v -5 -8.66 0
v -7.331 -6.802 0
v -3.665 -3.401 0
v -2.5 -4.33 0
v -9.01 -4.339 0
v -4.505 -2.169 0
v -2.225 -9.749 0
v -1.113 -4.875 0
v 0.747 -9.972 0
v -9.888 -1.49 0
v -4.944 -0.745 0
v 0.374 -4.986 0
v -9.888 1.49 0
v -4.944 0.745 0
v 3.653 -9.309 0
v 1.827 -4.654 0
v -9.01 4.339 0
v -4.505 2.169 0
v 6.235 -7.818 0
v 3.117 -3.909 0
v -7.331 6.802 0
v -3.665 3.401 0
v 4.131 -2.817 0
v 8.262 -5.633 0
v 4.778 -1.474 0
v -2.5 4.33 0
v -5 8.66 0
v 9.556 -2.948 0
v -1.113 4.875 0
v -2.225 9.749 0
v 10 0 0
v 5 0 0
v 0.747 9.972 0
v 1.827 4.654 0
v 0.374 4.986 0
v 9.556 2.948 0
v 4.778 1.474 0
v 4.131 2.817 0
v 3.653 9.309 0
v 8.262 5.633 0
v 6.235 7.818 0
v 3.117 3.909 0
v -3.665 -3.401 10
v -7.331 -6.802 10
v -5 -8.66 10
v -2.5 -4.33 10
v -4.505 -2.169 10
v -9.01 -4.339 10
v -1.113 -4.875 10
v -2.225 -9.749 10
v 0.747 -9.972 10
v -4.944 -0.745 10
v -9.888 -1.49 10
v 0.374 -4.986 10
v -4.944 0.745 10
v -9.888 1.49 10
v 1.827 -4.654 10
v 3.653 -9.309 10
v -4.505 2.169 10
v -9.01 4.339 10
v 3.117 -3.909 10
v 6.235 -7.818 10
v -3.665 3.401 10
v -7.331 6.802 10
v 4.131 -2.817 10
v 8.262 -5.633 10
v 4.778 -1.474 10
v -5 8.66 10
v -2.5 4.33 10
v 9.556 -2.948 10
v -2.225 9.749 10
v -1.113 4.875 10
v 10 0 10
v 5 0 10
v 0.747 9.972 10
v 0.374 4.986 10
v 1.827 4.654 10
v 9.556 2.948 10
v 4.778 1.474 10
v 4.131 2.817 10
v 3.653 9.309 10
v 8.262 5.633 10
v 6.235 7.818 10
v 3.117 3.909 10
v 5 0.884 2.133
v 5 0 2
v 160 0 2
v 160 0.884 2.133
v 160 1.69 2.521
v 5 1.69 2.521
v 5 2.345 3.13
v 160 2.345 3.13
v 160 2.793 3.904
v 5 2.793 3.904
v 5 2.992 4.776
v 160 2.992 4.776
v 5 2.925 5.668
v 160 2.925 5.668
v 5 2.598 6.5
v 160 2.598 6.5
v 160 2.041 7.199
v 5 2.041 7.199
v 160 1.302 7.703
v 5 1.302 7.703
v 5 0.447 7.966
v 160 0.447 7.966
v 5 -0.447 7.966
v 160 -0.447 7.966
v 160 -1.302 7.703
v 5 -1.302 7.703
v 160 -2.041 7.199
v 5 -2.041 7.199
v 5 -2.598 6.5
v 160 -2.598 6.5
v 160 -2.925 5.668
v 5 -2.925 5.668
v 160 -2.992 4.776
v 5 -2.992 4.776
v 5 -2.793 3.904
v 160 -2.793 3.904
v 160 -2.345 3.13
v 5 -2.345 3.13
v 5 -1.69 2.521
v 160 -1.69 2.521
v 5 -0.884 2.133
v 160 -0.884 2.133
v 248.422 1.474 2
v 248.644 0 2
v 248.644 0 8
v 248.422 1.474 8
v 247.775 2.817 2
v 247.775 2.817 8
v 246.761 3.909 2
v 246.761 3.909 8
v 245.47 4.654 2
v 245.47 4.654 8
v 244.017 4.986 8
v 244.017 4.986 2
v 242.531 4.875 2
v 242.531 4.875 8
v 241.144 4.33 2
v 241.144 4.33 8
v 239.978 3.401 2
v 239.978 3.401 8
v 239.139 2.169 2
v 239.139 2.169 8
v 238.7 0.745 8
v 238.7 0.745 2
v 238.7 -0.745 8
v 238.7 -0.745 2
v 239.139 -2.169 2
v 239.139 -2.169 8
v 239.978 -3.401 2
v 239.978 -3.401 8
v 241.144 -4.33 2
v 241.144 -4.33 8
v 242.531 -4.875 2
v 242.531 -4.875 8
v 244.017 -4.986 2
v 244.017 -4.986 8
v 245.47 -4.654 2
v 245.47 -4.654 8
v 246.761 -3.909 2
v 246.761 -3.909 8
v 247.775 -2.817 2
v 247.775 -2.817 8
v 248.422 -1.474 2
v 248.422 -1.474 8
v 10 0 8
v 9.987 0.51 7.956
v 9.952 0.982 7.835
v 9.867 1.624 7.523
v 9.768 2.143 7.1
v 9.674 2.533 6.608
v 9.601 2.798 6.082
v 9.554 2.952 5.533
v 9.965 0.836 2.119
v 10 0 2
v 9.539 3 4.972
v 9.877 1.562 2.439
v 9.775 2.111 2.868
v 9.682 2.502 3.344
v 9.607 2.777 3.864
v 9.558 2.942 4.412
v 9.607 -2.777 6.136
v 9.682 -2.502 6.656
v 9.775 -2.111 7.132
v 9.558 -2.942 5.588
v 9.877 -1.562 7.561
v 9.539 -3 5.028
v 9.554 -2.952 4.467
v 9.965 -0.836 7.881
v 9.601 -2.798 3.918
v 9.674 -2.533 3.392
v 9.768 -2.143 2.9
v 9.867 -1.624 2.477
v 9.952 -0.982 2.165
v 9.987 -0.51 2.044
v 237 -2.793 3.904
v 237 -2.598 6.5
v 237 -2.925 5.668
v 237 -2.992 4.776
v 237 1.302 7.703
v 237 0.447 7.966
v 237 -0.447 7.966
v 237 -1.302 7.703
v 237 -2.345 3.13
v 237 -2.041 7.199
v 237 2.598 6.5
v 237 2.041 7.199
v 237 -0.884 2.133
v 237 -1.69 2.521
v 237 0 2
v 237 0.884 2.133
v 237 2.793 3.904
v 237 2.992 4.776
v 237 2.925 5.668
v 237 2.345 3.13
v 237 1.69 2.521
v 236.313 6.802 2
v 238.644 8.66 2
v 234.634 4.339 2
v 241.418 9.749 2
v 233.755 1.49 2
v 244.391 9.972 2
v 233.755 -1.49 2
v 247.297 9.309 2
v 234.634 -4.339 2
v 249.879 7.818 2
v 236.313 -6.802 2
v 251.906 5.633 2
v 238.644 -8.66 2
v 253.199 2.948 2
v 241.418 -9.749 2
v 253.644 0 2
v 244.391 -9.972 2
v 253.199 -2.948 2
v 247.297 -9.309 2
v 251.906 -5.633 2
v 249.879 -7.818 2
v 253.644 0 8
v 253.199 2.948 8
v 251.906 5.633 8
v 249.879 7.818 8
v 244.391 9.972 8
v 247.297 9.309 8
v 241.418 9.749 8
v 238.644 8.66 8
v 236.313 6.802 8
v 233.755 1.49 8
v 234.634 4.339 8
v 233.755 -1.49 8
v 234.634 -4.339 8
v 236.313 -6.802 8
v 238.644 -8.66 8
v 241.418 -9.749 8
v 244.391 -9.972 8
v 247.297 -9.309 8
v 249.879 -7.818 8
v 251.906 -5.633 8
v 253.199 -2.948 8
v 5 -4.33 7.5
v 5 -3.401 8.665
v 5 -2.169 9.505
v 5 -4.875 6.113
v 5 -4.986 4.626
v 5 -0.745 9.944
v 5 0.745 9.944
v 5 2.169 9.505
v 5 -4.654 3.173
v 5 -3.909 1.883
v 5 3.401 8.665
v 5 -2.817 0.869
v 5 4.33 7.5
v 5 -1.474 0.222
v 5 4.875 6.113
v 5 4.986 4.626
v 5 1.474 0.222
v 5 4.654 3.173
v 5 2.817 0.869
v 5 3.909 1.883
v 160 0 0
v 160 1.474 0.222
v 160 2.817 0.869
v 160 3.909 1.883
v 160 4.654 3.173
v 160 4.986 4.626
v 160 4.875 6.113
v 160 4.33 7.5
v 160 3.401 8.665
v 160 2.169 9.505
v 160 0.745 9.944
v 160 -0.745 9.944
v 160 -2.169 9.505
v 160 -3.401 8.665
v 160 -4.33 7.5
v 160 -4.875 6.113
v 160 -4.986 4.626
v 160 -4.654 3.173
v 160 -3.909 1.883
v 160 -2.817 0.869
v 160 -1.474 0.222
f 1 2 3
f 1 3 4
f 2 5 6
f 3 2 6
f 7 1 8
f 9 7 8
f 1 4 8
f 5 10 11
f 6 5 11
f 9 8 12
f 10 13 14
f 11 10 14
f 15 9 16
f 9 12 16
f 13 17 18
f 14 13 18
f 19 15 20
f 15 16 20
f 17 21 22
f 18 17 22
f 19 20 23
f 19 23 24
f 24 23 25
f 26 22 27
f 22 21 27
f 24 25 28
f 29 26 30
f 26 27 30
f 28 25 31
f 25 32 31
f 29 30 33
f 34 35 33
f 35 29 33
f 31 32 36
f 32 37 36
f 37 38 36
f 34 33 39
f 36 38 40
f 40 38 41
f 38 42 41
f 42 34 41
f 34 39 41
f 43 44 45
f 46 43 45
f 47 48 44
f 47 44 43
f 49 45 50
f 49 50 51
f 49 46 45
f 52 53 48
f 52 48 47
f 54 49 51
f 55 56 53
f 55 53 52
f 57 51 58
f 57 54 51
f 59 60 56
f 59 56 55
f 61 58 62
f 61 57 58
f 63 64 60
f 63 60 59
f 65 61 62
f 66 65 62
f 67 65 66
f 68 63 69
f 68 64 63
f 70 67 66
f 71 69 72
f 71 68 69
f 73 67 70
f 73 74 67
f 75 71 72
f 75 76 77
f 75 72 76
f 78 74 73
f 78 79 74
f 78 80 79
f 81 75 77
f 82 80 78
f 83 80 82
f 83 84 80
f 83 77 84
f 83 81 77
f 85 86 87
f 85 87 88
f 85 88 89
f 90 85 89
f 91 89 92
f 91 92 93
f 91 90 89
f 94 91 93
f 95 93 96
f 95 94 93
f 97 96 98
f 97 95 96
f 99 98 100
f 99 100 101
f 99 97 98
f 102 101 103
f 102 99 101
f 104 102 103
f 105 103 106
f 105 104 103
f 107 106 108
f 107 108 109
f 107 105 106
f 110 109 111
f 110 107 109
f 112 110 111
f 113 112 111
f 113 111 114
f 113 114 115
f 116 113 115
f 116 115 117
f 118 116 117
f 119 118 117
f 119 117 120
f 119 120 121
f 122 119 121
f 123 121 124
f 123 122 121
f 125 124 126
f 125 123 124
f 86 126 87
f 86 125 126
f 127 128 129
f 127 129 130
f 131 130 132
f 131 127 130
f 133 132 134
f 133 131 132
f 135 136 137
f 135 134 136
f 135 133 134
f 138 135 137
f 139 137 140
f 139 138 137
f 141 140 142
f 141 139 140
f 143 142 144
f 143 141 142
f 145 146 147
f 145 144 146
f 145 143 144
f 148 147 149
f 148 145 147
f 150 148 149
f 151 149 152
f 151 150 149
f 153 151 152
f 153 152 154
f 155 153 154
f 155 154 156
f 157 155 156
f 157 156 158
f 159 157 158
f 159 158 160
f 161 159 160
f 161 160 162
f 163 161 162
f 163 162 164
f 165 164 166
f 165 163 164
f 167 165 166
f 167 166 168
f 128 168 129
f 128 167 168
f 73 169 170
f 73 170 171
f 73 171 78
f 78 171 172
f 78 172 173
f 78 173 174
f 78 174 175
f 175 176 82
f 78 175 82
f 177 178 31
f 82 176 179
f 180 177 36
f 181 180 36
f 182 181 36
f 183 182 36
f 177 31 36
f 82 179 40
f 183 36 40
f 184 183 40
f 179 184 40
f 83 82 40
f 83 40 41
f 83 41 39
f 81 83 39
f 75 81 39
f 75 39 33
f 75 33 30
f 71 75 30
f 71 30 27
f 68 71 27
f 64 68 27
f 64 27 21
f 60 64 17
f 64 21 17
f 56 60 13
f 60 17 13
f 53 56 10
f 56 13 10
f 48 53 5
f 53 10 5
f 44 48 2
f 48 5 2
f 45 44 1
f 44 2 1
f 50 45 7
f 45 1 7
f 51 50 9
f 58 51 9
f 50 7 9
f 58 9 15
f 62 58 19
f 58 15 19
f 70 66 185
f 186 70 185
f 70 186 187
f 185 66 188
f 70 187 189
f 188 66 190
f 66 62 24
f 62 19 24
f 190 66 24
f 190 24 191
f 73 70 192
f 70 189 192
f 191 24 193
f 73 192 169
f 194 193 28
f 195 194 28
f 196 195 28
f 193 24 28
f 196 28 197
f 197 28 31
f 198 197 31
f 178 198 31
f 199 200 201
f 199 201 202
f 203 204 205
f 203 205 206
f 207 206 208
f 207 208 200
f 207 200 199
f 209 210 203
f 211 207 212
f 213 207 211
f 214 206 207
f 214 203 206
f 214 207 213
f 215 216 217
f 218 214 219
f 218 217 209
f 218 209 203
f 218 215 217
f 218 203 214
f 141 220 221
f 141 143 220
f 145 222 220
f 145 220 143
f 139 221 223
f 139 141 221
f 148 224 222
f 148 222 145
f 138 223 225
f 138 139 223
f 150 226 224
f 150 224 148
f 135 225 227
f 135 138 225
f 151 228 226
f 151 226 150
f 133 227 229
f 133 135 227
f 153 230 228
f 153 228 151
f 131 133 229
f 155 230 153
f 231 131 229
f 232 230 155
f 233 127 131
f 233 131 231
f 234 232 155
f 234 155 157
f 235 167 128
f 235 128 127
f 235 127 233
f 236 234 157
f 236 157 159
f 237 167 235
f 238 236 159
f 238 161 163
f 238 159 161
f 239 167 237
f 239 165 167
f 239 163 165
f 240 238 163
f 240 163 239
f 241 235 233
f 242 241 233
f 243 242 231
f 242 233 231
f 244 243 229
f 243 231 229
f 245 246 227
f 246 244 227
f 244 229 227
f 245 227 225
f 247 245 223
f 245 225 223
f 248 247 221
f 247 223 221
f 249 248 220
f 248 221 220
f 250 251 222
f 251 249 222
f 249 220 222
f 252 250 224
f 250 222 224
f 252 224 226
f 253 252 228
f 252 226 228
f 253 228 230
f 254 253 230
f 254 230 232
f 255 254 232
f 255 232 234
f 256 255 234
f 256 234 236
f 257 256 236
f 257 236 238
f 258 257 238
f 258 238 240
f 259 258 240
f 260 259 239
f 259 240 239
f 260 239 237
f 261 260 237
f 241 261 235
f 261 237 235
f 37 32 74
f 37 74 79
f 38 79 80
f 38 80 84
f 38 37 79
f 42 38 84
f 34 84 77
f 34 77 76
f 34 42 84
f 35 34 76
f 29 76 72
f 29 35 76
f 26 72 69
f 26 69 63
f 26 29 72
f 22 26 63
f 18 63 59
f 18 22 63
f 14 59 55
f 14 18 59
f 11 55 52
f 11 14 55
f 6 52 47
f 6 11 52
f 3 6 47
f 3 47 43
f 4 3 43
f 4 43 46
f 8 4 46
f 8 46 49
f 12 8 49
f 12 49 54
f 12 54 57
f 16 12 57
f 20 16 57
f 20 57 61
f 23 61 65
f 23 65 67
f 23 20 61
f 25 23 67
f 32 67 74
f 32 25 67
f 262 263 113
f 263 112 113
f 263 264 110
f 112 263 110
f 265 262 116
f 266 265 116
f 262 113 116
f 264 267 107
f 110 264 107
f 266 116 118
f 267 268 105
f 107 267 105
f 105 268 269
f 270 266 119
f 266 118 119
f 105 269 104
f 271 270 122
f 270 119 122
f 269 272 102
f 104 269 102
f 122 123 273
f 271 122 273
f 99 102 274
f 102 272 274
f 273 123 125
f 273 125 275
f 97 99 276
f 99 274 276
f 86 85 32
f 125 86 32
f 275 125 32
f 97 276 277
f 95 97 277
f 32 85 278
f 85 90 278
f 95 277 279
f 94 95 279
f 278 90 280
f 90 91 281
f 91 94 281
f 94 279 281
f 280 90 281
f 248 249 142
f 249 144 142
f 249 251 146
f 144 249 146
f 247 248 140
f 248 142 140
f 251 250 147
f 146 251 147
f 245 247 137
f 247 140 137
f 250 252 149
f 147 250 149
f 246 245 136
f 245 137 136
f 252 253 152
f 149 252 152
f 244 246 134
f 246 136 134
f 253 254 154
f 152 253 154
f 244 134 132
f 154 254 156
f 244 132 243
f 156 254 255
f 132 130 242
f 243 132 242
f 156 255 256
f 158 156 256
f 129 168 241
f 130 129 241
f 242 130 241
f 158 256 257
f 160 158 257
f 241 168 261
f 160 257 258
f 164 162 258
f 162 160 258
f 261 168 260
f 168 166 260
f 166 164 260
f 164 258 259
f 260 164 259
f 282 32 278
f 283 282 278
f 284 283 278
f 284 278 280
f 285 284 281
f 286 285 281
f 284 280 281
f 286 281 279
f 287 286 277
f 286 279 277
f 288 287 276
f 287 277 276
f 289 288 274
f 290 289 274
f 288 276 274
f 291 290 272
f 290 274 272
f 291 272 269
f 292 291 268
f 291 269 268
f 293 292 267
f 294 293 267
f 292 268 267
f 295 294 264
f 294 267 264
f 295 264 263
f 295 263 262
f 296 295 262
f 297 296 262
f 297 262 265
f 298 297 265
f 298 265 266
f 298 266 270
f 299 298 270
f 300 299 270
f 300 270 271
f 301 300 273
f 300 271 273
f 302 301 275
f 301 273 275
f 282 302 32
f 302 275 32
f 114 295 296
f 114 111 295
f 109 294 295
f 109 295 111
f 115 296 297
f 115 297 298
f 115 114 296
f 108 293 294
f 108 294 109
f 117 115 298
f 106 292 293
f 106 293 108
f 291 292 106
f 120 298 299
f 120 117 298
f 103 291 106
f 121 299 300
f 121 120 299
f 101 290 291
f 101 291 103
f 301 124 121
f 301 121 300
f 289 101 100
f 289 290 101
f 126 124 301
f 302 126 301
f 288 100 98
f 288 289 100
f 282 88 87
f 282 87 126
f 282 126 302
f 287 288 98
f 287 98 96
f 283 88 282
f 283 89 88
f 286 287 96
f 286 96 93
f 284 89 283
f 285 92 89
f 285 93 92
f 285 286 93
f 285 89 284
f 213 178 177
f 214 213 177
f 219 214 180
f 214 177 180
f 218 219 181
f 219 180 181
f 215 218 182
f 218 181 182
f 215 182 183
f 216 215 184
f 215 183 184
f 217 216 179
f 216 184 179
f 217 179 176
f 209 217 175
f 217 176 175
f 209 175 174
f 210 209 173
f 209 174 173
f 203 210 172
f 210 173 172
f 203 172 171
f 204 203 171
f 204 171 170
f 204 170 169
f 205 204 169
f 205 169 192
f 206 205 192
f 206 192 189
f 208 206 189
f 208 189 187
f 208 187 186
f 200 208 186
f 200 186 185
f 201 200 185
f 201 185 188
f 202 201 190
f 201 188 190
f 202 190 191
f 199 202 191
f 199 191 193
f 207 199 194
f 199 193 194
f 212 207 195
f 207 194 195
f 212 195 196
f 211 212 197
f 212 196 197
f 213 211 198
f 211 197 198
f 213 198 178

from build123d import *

# Parameters (mm, degrees)
SKETCH_1_R               = 10
SKETCH_1_R_2             = 5
EXTRUDE_1_DEPTH          = 10
EXTRUDE_START            = 7
SKETCH_2_R               = 3
EXTRUDE_1_2_DEPTH        = 230
SKETCH_3_R               = 10
SKETCH_3_R_2             = 5
EXTRUDE_2_DEPTH          = 10
CUT_EXTRUDE_2_DEPTH      = 16
CUT_EXTRUDE_2_DEPTH_BACK = 16
SKETCH_5_W               = 25.612754073
SKETCH_5_H               = 5.27381734
SKETCH_5_W_2             = 26.516733628
SKETCH_5_H_2             = 5.299141178
EXTRUDE_START_2          = 5
SKETCH_6_R               = 5
SKETCH_6_R_2             = 3
EXTRUDE_3_DEPTH          = 155


with BuildPart() as part:
    # 草图1 → Extrude 1 (new body)
    with BuildSketch(Plane.XY):
        Circle(SKETCH_1_R)
        Circle(SKETCH_1_R_2, mode=Mode.SUBTRACT)
    extrude(amount=EXTRUDE_1_DEPTH)

    # 草图2 → Extrude 1 2 (add)
    with BuildSketch(Plane(origin=(0, 0, 0), x_dir=(0, 0, -1), z_dir=(1, 0, 0)).offset(EXTRUDE_START)):
        with Locations((-5, 0)):
            Circle(SKETCH_2_R)
    extrude(amount=EXTRUDE_1_2_DEPTH)


with BuildPart() as body_2:
    # 草图3 → 拉伸-薄壁2 (new body)
    with BuildSketch(Plane.XY):
        with Locations((243.643659116, 0)):
            Circle(SKETCH_3_R)
        with Locations((243.643659116, 0)):
            Circle(SKETCH_3_R_2, mode=Mode.SUBTRACT)
    extrude(amount=EXTRUDE_2_DEPTH)

    # 草图5 → 切除-拉伸2 (cut, two sides: drawn at the far end of the back side and taken through both)
    with BuildSketch(Plane(origin=(0, 0, 0), x_dir=(1, 0, 0), z_dir=(0, 1, 0)).offset(-CUT_EXTRUDE_2_DEPTH_BACK)):
        with Locations((246.038279089, 0.63690867)):
            Rectangle(SKETCH_5_W, SKETCH_5_H)
        with Locations((246.490268866, -10.649570589)):
            Rectangle(SKETCH_5_W_2, SKETCH_5_H_2)
    extrude(amount=CUT_EXTRUDE_2_DEPTH + CUT_EXTRUDE_2_DEPTH_BACK, mode=Mode.SUBTRACT)


with BuildPart() as body_3:
    # 草图6 → 拉伸-薄壁3 (new body)
    with BuildSketch(Plane(origin=(0, 0, 0), x_dir=(0, 0, -1), z_dir=(1, 0, 0)).offset(EXTRUDE_START_2)):
        with Locations((-5, 0)):
            Circle(SKETCH_6_R)
        with Locations((-5, 0)):
            Circle(SKETCH_6_R_2, mode=Mode.SUBTRACT)
    extrude(amount=EXTRUDE_3_DEPTH)


solid = Compound([part.part, body_2.part, body_3.part])
